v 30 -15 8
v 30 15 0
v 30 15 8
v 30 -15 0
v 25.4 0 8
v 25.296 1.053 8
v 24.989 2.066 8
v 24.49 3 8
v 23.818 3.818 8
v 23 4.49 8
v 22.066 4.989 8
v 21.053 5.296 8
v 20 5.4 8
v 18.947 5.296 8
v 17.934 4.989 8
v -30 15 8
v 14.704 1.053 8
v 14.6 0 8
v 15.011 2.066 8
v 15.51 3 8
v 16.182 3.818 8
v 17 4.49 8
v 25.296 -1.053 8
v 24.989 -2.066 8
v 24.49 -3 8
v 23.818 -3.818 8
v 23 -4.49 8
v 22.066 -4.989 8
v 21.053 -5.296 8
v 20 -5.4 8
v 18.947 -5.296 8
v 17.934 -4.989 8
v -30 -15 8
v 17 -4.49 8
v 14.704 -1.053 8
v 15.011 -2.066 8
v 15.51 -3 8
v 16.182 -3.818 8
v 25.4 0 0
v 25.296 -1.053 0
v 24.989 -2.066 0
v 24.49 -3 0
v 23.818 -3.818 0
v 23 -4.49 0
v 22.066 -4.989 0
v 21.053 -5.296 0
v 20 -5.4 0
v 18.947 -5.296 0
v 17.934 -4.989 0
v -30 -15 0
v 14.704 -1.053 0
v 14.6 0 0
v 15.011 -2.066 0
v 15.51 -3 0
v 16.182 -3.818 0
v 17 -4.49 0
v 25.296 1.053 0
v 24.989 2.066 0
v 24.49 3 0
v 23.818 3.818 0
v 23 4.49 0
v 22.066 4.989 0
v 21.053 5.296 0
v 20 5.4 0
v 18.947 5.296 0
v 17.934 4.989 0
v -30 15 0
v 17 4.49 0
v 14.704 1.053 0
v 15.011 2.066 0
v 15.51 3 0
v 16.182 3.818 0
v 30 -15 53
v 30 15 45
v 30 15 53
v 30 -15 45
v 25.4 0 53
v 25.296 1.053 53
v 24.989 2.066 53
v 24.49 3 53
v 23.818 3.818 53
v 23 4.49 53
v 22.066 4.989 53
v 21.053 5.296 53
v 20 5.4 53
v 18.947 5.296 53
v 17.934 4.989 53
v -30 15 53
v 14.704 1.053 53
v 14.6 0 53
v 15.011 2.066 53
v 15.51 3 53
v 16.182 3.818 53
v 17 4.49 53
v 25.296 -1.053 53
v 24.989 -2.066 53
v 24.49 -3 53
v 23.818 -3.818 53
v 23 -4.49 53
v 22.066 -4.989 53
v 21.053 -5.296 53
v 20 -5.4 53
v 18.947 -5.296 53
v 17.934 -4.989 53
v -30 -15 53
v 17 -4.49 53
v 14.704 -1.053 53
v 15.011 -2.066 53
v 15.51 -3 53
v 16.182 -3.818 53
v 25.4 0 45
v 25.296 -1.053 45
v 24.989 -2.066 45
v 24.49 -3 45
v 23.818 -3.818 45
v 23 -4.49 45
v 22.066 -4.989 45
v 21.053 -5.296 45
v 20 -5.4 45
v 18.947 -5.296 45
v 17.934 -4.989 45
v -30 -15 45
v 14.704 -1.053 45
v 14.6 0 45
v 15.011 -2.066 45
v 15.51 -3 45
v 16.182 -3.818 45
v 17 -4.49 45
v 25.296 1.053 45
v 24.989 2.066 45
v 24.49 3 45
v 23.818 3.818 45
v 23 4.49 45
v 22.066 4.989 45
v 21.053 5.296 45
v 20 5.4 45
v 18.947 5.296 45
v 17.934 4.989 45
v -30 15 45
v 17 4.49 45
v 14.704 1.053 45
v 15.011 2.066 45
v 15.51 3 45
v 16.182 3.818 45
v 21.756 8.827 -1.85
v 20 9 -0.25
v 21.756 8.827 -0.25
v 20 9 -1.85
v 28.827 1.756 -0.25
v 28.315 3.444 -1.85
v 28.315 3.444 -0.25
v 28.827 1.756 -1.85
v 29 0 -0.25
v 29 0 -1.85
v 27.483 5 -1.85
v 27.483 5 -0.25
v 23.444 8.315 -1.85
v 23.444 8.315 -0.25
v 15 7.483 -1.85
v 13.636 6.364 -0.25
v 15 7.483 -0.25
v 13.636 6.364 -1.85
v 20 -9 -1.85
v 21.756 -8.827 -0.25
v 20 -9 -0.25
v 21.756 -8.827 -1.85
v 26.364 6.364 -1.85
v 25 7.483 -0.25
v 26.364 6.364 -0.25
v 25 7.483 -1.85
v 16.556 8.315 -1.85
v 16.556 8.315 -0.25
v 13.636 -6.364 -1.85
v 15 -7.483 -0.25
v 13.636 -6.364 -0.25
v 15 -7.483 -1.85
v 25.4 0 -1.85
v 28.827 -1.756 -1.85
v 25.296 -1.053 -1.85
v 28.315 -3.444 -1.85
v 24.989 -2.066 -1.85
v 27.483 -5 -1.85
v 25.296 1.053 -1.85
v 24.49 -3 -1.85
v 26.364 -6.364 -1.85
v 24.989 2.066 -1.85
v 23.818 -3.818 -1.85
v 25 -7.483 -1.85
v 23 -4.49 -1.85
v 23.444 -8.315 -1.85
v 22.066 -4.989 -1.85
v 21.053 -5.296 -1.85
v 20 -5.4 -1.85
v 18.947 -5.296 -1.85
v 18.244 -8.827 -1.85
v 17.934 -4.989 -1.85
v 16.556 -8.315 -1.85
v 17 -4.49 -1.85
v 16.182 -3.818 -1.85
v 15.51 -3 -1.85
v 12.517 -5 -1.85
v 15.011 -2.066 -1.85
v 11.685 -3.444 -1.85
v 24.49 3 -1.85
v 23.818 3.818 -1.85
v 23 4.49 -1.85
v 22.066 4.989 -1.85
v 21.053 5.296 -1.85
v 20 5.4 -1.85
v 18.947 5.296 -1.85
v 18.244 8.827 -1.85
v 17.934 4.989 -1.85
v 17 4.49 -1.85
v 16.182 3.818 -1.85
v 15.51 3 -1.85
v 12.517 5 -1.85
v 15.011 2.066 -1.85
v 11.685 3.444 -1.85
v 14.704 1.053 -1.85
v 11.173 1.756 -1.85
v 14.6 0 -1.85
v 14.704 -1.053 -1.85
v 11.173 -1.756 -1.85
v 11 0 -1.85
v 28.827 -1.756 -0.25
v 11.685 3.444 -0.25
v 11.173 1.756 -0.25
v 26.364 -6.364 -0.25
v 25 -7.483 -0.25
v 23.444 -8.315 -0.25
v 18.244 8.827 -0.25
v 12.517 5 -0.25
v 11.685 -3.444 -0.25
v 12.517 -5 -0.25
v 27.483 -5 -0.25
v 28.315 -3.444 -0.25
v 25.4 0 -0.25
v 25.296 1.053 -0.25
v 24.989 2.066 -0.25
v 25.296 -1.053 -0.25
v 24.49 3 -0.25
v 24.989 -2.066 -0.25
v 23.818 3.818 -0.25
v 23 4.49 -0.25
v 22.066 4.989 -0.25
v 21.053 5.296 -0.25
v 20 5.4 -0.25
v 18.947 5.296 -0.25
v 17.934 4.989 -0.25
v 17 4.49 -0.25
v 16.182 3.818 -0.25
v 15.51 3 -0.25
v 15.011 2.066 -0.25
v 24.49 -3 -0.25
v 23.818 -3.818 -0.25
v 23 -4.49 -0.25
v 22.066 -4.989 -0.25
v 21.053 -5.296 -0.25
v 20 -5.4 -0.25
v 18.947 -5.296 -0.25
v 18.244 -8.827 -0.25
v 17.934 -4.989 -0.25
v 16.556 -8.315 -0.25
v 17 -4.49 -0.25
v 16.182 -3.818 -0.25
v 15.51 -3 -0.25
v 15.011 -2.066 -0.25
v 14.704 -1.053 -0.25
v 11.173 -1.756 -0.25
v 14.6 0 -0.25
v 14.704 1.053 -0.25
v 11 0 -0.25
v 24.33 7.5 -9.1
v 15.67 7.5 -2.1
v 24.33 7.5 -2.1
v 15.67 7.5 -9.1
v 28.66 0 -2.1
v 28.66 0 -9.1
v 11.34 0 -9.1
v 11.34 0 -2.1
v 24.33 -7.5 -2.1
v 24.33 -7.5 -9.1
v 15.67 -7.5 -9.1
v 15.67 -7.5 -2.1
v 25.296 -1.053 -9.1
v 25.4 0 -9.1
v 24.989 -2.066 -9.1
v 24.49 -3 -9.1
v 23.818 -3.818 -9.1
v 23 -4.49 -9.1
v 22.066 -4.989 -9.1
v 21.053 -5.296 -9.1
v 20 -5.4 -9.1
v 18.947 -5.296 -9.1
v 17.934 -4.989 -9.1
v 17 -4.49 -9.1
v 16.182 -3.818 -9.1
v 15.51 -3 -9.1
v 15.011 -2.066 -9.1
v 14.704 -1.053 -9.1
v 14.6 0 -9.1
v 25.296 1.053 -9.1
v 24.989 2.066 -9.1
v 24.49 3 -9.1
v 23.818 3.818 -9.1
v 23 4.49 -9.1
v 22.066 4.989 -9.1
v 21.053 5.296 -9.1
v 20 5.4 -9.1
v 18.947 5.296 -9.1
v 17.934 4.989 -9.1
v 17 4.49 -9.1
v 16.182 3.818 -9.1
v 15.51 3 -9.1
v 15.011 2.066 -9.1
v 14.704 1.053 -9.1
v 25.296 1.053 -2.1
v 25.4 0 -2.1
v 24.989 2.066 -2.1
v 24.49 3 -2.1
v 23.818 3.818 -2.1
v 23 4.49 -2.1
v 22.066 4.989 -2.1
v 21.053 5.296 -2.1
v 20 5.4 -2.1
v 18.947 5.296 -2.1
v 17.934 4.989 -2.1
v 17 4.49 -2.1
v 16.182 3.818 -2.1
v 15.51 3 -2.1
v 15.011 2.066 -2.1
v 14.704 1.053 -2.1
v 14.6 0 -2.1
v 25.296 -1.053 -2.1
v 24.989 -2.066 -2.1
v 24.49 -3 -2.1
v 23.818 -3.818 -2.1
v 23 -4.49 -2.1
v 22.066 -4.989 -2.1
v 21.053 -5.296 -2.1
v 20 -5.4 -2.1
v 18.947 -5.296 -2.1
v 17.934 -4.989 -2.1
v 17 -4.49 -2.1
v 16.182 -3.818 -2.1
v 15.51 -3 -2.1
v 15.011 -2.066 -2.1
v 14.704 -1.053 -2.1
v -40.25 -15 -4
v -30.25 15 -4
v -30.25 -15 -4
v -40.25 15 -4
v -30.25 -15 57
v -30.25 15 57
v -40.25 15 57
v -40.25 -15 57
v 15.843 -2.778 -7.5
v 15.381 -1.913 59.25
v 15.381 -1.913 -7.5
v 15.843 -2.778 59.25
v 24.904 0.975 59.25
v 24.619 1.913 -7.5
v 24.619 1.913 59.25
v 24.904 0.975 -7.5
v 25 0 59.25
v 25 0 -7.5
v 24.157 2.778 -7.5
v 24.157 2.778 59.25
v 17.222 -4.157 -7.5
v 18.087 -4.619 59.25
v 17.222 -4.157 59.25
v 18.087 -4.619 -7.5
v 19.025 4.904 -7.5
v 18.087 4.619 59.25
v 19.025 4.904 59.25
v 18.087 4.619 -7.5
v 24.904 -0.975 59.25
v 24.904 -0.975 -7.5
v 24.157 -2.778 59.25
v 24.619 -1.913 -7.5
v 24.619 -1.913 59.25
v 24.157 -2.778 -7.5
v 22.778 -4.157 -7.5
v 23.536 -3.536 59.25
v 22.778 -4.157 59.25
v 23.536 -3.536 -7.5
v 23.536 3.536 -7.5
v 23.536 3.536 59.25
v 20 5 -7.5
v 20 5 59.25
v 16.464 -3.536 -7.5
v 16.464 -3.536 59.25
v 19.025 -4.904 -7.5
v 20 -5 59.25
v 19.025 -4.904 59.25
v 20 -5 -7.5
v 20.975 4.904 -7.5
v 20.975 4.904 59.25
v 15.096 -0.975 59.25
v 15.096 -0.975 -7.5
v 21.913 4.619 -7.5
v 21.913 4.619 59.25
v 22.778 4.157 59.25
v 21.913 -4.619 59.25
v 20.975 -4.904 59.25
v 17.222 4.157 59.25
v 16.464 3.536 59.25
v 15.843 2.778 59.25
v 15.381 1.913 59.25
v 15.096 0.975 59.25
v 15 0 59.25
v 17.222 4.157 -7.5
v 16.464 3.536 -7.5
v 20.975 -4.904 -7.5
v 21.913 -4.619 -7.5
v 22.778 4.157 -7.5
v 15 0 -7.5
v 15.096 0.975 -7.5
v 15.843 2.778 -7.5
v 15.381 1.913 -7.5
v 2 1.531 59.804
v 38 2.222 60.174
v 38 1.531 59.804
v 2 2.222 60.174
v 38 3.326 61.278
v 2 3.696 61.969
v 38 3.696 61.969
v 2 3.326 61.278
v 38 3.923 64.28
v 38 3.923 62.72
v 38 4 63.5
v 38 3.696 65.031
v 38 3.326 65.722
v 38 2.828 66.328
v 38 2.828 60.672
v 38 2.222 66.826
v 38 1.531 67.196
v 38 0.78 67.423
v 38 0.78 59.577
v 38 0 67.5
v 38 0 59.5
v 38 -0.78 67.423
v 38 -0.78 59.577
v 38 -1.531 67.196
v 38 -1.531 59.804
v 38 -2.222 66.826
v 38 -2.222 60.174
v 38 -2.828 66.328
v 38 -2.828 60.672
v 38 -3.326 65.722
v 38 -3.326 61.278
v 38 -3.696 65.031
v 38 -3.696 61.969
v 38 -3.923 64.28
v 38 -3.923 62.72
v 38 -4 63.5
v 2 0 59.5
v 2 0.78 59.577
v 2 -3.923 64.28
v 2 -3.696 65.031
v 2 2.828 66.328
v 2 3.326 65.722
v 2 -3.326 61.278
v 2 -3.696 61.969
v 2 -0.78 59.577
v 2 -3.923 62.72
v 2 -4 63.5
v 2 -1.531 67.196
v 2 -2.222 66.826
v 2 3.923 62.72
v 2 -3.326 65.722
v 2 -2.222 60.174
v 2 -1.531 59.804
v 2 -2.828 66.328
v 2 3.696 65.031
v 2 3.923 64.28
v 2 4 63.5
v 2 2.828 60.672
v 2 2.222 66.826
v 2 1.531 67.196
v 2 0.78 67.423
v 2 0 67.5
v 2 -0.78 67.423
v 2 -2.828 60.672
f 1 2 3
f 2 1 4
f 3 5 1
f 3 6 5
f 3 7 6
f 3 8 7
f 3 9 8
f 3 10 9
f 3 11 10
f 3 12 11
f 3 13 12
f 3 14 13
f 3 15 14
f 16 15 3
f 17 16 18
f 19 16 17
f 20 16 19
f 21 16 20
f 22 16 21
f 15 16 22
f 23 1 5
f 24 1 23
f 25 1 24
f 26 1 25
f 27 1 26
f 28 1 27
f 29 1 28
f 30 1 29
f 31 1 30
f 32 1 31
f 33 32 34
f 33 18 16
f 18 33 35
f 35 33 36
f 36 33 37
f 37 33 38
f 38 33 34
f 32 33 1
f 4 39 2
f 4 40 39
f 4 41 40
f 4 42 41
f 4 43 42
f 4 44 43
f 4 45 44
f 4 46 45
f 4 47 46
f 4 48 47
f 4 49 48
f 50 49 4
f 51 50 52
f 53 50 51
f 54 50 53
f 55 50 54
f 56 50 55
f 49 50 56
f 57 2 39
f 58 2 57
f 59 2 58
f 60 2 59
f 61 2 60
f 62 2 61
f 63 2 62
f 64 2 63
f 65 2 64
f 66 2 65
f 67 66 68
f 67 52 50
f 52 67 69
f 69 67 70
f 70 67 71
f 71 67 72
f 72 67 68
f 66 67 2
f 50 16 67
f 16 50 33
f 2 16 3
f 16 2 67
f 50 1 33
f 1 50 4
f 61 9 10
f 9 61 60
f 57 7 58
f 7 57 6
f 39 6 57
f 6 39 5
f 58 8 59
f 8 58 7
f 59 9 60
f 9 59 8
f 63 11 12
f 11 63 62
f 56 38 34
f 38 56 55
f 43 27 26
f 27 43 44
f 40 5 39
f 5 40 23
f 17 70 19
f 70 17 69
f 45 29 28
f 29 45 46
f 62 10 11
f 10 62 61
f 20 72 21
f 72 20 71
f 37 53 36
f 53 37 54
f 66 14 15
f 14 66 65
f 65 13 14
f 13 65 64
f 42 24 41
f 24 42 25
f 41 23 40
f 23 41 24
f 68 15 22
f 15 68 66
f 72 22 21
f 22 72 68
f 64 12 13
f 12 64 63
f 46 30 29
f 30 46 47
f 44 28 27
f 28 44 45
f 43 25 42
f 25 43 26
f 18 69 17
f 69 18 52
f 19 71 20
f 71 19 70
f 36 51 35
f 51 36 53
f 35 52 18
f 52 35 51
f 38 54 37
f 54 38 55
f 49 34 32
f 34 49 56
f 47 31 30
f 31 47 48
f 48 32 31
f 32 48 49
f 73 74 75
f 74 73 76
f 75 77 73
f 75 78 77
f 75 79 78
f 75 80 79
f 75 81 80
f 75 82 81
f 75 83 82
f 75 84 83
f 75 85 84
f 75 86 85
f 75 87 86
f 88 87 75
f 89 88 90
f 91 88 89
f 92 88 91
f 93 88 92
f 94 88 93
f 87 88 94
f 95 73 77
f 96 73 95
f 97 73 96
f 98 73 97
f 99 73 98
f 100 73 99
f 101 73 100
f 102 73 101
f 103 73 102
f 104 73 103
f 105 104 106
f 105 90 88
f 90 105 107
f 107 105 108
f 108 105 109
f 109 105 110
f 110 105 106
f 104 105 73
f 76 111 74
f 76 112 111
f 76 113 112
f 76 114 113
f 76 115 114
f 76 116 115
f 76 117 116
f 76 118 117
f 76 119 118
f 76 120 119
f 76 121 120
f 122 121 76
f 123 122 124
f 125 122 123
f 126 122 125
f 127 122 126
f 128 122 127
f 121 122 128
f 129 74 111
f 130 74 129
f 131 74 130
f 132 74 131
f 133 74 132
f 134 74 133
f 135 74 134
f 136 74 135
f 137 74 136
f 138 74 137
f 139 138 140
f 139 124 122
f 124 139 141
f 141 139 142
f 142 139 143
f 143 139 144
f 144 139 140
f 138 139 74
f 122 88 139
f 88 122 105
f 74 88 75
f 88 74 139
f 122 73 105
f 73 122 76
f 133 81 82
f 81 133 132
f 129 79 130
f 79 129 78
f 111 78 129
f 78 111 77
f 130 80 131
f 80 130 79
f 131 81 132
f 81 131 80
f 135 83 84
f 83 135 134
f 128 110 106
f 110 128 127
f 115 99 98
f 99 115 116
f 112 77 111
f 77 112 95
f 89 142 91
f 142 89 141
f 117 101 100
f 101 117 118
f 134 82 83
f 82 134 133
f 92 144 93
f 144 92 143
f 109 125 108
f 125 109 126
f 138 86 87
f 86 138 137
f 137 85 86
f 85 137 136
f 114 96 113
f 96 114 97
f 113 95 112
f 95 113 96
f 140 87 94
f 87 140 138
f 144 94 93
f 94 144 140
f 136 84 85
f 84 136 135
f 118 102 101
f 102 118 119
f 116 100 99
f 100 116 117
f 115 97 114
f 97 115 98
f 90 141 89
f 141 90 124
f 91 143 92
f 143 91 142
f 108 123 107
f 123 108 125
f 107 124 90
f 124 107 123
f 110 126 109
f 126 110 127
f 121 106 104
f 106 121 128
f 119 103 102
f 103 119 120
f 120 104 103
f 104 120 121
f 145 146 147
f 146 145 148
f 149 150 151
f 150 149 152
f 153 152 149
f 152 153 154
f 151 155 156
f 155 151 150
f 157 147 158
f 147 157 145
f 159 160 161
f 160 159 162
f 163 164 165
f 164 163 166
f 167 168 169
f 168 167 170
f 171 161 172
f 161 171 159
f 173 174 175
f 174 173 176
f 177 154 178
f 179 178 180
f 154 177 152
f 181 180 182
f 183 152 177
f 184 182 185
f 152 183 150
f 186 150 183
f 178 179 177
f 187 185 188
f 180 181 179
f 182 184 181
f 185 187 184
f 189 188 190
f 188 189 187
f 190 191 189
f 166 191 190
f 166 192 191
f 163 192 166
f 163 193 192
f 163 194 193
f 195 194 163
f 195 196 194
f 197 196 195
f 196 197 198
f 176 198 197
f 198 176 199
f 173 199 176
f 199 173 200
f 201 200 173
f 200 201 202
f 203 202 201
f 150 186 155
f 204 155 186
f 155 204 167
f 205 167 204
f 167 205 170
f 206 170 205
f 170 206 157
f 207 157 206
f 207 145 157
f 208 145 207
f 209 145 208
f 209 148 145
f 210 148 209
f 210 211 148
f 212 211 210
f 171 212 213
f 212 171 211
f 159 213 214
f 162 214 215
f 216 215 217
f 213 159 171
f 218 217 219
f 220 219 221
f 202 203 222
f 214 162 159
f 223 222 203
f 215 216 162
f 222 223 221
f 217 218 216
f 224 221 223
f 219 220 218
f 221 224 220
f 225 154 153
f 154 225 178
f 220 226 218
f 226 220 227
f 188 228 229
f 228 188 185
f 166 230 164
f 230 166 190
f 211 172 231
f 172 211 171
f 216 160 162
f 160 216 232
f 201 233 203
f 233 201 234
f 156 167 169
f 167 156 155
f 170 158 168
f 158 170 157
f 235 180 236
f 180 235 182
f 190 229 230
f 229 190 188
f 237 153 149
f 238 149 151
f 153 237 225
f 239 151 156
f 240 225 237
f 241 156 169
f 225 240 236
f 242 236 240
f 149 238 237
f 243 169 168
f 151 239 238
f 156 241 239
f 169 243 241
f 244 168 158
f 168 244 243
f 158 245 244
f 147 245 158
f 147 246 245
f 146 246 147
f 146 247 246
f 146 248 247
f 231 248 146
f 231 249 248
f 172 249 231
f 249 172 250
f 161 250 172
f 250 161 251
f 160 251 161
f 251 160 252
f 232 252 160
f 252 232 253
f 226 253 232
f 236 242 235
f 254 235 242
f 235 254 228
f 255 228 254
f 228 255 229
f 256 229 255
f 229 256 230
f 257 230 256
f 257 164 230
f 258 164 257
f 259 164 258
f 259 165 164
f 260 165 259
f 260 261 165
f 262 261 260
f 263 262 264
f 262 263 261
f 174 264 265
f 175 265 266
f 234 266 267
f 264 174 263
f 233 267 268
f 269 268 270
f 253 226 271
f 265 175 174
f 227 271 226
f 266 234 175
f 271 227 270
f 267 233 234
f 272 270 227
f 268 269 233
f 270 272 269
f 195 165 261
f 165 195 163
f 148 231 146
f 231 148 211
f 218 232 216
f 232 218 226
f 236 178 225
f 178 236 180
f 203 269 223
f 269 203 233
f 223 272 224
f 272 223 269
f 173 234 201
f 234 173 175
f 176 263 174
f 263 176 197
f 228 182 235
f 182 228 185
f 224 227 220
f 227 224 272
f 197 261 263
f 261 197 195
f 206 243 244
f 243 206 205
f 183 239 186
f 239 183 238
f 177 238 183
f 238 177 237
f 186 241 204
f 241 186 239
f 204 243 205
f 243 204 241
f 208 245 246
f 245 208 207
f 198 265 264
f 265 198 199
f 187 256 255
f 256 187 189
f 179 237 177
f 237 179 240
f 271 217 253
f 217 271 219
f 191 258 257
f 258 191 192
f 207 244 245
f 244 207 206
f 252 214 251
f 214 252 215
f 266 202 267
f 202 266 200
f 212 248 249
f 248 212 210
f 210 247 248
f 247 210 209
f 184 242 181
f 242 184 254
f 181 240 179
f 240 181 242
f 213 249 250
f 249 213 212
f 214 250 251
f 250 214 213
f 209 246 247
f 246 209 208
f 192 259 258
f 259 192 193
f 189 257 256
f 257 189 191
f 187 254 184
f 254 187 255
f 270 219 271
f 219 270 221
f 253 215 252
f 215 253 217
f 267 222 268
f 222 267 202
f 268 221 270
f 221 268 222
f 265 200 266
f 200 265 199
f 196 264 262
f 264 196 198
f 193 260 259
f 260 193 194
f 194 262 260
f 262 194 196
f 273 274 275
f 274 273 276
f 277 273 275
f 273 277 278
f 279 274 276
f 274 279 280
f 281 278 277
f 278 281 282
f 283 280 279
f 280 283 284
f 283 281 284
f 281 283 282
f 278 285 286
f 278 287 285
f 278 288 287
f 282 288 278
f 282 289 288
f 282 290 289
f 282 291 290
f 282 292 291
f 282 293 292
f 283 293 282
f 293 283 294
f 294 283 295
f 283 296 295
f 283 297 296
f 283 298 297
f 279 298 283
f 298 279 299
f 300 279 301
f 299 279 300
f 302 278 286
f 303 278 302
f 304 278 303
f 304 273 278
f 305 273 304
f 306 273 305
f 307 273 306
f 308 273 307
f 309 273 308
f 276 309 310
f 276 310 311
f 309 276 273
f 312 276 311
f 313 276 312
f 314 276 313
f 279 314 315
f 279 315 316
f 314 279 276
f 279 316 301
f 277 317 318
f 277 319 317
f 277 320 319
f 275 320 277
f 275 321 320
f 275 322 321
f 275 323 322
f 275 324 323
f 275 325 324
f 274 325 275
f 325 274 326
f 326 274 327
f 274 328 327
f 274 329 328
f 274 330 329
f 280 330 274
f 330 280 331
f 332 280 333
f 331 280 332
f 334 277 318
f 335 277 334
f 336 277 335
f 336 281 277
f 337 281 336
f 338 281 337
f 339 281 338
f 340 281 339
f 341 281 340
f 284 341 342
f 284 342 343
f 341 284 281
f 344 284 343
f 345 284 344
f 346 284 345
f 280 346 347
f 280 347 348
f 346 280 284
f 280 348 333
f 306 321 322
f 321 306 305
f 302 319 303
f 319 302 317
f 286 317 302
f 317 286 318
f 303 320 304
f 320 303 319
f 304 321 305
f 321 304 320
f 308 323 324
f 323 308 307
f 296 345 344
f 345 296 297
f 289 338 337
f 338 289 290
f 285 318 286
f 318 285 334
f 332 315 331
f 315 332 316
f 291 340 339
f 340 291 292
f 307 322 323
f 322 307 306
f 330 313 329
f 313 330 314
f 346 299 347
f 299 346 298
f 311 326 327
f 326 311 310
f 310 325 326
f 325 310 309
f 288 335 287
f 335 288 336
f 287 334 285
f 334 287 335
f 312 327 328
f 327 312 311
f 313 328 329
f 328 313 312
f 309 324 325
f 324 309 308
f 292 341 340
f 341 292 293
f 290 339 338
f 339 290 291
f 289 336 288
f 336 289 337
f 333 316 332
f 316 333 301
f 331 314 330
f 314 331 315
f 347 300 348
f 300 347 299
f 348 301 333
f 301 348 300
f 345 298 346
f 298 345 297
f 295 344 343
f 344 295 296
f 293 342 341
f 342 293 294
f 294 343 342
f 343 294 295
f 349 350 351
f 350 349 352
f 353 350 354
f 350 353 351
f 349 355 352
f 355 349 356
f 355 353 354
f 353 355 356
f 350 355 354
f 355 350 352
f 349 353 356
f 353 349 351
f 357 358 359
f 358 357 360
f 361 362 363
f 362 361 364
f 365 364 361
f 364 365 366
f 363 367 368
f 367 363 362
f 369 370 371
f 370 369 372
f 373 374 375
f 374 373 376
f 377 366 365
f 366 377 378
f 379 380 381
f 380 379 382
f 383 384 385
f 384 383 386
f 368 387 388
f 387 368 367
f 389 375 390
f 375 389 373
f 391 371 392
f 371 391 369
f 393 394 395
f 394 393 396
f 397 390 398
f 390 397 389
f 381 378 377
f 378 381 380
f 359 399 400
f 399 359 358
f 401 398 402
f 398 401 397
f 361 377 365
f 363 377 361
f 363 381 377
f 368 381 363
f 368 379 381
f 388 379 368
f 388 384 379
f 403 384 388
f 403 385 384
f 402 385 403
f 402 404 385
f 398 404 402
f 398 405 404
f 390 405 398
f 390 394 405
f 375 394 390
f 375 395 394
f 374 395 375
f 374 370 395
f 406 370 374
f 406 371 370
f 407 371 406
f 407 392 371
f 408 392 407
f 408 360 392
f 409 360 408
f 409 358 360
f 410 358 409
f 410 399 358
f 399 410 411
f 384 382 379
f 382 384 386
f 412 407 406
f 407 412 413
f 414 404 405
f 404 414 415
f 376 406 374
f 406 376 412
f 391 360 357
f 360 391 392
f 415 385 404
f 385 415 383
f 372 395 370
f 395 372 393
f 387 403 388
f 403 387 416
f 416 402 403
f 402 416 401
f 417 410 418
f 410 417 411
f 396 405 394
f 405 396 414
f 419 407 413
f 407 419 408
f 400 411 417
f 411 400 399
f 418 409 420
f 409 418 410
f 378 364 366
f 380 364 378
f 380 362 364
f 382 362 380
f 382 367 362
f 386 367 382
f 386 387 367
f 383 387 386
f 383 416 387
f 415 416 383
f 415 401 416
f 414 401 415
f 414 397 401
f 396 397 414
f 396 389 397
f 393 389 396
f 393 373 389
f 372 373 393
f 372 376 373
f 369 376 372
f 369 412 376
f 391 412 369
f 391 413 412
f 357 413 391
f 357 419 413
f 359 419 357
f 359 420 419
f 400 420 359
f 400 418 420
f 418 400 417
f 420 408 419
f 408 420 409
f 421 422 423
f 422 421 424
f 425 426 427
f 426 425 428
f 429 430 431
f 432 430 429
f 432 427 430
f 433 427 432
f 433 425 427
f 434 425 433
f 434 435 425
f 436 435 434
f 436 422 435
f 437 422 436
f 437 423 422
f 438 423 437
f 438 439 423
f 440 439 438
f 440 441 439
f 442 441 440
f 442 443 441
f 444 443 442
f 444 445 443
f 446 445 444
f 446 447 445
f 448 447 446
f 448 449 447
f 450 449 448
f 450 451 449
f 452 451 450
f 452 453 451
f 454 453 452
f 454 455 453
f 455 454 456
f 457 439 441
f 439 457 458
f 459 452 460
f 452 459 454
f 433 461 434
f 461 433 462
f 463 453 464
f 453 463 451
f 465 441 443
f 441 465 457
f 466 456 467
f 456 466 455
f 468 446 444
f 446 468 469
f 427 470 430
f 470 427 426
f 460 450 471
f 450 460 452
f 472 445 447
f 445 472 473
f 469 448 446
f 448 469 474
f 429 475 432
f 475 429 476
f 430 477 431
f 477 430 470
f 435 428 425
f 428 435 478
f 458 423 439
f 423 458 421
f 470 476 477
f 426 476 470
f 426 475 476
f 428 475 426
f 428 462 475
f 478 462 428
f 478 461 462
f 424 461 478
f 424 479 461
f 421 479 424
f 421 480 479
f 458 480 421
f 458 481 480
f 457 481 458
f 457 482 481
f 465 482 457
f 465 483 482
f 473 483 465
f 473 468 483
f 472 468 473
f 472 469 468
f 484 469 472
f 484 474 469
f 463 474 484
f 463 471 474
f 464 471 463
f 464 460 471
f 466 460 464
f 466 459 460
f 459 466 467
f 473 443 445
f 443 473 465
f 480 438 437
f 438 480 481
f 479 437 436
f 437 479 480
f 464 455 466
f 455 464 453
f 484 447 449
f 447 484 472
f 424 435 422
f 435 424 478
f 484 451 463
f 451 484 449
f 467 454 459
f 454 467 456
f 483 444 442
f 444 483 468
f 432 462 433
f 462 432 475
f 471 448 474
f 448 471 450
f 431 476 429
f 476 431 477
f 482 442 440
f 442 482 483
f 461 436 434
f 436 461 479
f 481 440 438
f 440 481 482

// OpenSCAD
$fn = 32;

// ------------------------------------------------------------------------
// C clamp: throat 45 mm, screw d10
// Every part is its own module, assembly() places every instance.
// ------------------------------------------------------------------------

// --- part 1 ---
module clamp_arm() {
  difference() {
    translate([-30, -15, 0]) cube([60, 30, 8]);
    translate([20, 0, -1]) cylinder(h = 10, d = 10.8);
  }
}

// --- part 2 ---
module clamp_spine() {
  difference() {
    translate([-30.5, -15, 0]) cube([61, 30, 10]);
  }
}

// --- part 3 ---
module clamp_screw() {
  translate([0, 0, -33.375]) cylinder(h = 66.75, d = 10);
}

// --- part 4 ---
module clamp_washer() {
  difference() {
      translate([0, 0, 0]) cylinder(h = 1.6, d = 18);
      translate([0, 0, -1]) cylinder(h = 3.6, d = 10.8);
    }
}

// --- part 5 ---
module clamp_nut() {
  difference() {
    linear_extrude(height = 7) polygon(points = [[8.66, 0], [4.33, 7.5], [-4.33, 7.5], [-8.66, 0], [-4.33, -7.5], [4.33, -7.5]]);
    translate([0, 0, -1]) cylinder(h = 9, d = 10.8);
  }
}

// --- part 6 ---
module tommy_bar() {
  translate([0, 0, -18]) cylinder(h = 36, d = 8);
}

// --- assembly ---
module assembly() {
  color([0.80, 0.24, 0.20]) translate([0, 0, 0]) rotate([0, 0, 0]) clamp_arm();
  color([0.20, 0.45, 0.75]) translate([0, 0, 45]) rotate([0, 0, 0]) clamp_arm();
  color([0.25, 0.62, 0.32]) translate([-40.25, 0, 26.5]) rotate([0, 90, 0]) clamp_spine();
  color([0.92, 0.70, 0.18]) translate([20, 0, 25.875]) rotate([0, 0, 0]) clamp_screw();
  color([0.58, 0.35, 0.70]) translate([20, 0, -1.85]) rotate([0, 0, 0]) clamp_washer();
  color([0.16, 0.66, 0.66]) translate([20, 0, -9.1]) rotate([0, 0, 0]) clamp_nut();
  color([0.85, 0.48, 0.18]) translate([20, 0, 63.5]) rotate([0, 90, 0]) tommy_bar();
}

assembly();
